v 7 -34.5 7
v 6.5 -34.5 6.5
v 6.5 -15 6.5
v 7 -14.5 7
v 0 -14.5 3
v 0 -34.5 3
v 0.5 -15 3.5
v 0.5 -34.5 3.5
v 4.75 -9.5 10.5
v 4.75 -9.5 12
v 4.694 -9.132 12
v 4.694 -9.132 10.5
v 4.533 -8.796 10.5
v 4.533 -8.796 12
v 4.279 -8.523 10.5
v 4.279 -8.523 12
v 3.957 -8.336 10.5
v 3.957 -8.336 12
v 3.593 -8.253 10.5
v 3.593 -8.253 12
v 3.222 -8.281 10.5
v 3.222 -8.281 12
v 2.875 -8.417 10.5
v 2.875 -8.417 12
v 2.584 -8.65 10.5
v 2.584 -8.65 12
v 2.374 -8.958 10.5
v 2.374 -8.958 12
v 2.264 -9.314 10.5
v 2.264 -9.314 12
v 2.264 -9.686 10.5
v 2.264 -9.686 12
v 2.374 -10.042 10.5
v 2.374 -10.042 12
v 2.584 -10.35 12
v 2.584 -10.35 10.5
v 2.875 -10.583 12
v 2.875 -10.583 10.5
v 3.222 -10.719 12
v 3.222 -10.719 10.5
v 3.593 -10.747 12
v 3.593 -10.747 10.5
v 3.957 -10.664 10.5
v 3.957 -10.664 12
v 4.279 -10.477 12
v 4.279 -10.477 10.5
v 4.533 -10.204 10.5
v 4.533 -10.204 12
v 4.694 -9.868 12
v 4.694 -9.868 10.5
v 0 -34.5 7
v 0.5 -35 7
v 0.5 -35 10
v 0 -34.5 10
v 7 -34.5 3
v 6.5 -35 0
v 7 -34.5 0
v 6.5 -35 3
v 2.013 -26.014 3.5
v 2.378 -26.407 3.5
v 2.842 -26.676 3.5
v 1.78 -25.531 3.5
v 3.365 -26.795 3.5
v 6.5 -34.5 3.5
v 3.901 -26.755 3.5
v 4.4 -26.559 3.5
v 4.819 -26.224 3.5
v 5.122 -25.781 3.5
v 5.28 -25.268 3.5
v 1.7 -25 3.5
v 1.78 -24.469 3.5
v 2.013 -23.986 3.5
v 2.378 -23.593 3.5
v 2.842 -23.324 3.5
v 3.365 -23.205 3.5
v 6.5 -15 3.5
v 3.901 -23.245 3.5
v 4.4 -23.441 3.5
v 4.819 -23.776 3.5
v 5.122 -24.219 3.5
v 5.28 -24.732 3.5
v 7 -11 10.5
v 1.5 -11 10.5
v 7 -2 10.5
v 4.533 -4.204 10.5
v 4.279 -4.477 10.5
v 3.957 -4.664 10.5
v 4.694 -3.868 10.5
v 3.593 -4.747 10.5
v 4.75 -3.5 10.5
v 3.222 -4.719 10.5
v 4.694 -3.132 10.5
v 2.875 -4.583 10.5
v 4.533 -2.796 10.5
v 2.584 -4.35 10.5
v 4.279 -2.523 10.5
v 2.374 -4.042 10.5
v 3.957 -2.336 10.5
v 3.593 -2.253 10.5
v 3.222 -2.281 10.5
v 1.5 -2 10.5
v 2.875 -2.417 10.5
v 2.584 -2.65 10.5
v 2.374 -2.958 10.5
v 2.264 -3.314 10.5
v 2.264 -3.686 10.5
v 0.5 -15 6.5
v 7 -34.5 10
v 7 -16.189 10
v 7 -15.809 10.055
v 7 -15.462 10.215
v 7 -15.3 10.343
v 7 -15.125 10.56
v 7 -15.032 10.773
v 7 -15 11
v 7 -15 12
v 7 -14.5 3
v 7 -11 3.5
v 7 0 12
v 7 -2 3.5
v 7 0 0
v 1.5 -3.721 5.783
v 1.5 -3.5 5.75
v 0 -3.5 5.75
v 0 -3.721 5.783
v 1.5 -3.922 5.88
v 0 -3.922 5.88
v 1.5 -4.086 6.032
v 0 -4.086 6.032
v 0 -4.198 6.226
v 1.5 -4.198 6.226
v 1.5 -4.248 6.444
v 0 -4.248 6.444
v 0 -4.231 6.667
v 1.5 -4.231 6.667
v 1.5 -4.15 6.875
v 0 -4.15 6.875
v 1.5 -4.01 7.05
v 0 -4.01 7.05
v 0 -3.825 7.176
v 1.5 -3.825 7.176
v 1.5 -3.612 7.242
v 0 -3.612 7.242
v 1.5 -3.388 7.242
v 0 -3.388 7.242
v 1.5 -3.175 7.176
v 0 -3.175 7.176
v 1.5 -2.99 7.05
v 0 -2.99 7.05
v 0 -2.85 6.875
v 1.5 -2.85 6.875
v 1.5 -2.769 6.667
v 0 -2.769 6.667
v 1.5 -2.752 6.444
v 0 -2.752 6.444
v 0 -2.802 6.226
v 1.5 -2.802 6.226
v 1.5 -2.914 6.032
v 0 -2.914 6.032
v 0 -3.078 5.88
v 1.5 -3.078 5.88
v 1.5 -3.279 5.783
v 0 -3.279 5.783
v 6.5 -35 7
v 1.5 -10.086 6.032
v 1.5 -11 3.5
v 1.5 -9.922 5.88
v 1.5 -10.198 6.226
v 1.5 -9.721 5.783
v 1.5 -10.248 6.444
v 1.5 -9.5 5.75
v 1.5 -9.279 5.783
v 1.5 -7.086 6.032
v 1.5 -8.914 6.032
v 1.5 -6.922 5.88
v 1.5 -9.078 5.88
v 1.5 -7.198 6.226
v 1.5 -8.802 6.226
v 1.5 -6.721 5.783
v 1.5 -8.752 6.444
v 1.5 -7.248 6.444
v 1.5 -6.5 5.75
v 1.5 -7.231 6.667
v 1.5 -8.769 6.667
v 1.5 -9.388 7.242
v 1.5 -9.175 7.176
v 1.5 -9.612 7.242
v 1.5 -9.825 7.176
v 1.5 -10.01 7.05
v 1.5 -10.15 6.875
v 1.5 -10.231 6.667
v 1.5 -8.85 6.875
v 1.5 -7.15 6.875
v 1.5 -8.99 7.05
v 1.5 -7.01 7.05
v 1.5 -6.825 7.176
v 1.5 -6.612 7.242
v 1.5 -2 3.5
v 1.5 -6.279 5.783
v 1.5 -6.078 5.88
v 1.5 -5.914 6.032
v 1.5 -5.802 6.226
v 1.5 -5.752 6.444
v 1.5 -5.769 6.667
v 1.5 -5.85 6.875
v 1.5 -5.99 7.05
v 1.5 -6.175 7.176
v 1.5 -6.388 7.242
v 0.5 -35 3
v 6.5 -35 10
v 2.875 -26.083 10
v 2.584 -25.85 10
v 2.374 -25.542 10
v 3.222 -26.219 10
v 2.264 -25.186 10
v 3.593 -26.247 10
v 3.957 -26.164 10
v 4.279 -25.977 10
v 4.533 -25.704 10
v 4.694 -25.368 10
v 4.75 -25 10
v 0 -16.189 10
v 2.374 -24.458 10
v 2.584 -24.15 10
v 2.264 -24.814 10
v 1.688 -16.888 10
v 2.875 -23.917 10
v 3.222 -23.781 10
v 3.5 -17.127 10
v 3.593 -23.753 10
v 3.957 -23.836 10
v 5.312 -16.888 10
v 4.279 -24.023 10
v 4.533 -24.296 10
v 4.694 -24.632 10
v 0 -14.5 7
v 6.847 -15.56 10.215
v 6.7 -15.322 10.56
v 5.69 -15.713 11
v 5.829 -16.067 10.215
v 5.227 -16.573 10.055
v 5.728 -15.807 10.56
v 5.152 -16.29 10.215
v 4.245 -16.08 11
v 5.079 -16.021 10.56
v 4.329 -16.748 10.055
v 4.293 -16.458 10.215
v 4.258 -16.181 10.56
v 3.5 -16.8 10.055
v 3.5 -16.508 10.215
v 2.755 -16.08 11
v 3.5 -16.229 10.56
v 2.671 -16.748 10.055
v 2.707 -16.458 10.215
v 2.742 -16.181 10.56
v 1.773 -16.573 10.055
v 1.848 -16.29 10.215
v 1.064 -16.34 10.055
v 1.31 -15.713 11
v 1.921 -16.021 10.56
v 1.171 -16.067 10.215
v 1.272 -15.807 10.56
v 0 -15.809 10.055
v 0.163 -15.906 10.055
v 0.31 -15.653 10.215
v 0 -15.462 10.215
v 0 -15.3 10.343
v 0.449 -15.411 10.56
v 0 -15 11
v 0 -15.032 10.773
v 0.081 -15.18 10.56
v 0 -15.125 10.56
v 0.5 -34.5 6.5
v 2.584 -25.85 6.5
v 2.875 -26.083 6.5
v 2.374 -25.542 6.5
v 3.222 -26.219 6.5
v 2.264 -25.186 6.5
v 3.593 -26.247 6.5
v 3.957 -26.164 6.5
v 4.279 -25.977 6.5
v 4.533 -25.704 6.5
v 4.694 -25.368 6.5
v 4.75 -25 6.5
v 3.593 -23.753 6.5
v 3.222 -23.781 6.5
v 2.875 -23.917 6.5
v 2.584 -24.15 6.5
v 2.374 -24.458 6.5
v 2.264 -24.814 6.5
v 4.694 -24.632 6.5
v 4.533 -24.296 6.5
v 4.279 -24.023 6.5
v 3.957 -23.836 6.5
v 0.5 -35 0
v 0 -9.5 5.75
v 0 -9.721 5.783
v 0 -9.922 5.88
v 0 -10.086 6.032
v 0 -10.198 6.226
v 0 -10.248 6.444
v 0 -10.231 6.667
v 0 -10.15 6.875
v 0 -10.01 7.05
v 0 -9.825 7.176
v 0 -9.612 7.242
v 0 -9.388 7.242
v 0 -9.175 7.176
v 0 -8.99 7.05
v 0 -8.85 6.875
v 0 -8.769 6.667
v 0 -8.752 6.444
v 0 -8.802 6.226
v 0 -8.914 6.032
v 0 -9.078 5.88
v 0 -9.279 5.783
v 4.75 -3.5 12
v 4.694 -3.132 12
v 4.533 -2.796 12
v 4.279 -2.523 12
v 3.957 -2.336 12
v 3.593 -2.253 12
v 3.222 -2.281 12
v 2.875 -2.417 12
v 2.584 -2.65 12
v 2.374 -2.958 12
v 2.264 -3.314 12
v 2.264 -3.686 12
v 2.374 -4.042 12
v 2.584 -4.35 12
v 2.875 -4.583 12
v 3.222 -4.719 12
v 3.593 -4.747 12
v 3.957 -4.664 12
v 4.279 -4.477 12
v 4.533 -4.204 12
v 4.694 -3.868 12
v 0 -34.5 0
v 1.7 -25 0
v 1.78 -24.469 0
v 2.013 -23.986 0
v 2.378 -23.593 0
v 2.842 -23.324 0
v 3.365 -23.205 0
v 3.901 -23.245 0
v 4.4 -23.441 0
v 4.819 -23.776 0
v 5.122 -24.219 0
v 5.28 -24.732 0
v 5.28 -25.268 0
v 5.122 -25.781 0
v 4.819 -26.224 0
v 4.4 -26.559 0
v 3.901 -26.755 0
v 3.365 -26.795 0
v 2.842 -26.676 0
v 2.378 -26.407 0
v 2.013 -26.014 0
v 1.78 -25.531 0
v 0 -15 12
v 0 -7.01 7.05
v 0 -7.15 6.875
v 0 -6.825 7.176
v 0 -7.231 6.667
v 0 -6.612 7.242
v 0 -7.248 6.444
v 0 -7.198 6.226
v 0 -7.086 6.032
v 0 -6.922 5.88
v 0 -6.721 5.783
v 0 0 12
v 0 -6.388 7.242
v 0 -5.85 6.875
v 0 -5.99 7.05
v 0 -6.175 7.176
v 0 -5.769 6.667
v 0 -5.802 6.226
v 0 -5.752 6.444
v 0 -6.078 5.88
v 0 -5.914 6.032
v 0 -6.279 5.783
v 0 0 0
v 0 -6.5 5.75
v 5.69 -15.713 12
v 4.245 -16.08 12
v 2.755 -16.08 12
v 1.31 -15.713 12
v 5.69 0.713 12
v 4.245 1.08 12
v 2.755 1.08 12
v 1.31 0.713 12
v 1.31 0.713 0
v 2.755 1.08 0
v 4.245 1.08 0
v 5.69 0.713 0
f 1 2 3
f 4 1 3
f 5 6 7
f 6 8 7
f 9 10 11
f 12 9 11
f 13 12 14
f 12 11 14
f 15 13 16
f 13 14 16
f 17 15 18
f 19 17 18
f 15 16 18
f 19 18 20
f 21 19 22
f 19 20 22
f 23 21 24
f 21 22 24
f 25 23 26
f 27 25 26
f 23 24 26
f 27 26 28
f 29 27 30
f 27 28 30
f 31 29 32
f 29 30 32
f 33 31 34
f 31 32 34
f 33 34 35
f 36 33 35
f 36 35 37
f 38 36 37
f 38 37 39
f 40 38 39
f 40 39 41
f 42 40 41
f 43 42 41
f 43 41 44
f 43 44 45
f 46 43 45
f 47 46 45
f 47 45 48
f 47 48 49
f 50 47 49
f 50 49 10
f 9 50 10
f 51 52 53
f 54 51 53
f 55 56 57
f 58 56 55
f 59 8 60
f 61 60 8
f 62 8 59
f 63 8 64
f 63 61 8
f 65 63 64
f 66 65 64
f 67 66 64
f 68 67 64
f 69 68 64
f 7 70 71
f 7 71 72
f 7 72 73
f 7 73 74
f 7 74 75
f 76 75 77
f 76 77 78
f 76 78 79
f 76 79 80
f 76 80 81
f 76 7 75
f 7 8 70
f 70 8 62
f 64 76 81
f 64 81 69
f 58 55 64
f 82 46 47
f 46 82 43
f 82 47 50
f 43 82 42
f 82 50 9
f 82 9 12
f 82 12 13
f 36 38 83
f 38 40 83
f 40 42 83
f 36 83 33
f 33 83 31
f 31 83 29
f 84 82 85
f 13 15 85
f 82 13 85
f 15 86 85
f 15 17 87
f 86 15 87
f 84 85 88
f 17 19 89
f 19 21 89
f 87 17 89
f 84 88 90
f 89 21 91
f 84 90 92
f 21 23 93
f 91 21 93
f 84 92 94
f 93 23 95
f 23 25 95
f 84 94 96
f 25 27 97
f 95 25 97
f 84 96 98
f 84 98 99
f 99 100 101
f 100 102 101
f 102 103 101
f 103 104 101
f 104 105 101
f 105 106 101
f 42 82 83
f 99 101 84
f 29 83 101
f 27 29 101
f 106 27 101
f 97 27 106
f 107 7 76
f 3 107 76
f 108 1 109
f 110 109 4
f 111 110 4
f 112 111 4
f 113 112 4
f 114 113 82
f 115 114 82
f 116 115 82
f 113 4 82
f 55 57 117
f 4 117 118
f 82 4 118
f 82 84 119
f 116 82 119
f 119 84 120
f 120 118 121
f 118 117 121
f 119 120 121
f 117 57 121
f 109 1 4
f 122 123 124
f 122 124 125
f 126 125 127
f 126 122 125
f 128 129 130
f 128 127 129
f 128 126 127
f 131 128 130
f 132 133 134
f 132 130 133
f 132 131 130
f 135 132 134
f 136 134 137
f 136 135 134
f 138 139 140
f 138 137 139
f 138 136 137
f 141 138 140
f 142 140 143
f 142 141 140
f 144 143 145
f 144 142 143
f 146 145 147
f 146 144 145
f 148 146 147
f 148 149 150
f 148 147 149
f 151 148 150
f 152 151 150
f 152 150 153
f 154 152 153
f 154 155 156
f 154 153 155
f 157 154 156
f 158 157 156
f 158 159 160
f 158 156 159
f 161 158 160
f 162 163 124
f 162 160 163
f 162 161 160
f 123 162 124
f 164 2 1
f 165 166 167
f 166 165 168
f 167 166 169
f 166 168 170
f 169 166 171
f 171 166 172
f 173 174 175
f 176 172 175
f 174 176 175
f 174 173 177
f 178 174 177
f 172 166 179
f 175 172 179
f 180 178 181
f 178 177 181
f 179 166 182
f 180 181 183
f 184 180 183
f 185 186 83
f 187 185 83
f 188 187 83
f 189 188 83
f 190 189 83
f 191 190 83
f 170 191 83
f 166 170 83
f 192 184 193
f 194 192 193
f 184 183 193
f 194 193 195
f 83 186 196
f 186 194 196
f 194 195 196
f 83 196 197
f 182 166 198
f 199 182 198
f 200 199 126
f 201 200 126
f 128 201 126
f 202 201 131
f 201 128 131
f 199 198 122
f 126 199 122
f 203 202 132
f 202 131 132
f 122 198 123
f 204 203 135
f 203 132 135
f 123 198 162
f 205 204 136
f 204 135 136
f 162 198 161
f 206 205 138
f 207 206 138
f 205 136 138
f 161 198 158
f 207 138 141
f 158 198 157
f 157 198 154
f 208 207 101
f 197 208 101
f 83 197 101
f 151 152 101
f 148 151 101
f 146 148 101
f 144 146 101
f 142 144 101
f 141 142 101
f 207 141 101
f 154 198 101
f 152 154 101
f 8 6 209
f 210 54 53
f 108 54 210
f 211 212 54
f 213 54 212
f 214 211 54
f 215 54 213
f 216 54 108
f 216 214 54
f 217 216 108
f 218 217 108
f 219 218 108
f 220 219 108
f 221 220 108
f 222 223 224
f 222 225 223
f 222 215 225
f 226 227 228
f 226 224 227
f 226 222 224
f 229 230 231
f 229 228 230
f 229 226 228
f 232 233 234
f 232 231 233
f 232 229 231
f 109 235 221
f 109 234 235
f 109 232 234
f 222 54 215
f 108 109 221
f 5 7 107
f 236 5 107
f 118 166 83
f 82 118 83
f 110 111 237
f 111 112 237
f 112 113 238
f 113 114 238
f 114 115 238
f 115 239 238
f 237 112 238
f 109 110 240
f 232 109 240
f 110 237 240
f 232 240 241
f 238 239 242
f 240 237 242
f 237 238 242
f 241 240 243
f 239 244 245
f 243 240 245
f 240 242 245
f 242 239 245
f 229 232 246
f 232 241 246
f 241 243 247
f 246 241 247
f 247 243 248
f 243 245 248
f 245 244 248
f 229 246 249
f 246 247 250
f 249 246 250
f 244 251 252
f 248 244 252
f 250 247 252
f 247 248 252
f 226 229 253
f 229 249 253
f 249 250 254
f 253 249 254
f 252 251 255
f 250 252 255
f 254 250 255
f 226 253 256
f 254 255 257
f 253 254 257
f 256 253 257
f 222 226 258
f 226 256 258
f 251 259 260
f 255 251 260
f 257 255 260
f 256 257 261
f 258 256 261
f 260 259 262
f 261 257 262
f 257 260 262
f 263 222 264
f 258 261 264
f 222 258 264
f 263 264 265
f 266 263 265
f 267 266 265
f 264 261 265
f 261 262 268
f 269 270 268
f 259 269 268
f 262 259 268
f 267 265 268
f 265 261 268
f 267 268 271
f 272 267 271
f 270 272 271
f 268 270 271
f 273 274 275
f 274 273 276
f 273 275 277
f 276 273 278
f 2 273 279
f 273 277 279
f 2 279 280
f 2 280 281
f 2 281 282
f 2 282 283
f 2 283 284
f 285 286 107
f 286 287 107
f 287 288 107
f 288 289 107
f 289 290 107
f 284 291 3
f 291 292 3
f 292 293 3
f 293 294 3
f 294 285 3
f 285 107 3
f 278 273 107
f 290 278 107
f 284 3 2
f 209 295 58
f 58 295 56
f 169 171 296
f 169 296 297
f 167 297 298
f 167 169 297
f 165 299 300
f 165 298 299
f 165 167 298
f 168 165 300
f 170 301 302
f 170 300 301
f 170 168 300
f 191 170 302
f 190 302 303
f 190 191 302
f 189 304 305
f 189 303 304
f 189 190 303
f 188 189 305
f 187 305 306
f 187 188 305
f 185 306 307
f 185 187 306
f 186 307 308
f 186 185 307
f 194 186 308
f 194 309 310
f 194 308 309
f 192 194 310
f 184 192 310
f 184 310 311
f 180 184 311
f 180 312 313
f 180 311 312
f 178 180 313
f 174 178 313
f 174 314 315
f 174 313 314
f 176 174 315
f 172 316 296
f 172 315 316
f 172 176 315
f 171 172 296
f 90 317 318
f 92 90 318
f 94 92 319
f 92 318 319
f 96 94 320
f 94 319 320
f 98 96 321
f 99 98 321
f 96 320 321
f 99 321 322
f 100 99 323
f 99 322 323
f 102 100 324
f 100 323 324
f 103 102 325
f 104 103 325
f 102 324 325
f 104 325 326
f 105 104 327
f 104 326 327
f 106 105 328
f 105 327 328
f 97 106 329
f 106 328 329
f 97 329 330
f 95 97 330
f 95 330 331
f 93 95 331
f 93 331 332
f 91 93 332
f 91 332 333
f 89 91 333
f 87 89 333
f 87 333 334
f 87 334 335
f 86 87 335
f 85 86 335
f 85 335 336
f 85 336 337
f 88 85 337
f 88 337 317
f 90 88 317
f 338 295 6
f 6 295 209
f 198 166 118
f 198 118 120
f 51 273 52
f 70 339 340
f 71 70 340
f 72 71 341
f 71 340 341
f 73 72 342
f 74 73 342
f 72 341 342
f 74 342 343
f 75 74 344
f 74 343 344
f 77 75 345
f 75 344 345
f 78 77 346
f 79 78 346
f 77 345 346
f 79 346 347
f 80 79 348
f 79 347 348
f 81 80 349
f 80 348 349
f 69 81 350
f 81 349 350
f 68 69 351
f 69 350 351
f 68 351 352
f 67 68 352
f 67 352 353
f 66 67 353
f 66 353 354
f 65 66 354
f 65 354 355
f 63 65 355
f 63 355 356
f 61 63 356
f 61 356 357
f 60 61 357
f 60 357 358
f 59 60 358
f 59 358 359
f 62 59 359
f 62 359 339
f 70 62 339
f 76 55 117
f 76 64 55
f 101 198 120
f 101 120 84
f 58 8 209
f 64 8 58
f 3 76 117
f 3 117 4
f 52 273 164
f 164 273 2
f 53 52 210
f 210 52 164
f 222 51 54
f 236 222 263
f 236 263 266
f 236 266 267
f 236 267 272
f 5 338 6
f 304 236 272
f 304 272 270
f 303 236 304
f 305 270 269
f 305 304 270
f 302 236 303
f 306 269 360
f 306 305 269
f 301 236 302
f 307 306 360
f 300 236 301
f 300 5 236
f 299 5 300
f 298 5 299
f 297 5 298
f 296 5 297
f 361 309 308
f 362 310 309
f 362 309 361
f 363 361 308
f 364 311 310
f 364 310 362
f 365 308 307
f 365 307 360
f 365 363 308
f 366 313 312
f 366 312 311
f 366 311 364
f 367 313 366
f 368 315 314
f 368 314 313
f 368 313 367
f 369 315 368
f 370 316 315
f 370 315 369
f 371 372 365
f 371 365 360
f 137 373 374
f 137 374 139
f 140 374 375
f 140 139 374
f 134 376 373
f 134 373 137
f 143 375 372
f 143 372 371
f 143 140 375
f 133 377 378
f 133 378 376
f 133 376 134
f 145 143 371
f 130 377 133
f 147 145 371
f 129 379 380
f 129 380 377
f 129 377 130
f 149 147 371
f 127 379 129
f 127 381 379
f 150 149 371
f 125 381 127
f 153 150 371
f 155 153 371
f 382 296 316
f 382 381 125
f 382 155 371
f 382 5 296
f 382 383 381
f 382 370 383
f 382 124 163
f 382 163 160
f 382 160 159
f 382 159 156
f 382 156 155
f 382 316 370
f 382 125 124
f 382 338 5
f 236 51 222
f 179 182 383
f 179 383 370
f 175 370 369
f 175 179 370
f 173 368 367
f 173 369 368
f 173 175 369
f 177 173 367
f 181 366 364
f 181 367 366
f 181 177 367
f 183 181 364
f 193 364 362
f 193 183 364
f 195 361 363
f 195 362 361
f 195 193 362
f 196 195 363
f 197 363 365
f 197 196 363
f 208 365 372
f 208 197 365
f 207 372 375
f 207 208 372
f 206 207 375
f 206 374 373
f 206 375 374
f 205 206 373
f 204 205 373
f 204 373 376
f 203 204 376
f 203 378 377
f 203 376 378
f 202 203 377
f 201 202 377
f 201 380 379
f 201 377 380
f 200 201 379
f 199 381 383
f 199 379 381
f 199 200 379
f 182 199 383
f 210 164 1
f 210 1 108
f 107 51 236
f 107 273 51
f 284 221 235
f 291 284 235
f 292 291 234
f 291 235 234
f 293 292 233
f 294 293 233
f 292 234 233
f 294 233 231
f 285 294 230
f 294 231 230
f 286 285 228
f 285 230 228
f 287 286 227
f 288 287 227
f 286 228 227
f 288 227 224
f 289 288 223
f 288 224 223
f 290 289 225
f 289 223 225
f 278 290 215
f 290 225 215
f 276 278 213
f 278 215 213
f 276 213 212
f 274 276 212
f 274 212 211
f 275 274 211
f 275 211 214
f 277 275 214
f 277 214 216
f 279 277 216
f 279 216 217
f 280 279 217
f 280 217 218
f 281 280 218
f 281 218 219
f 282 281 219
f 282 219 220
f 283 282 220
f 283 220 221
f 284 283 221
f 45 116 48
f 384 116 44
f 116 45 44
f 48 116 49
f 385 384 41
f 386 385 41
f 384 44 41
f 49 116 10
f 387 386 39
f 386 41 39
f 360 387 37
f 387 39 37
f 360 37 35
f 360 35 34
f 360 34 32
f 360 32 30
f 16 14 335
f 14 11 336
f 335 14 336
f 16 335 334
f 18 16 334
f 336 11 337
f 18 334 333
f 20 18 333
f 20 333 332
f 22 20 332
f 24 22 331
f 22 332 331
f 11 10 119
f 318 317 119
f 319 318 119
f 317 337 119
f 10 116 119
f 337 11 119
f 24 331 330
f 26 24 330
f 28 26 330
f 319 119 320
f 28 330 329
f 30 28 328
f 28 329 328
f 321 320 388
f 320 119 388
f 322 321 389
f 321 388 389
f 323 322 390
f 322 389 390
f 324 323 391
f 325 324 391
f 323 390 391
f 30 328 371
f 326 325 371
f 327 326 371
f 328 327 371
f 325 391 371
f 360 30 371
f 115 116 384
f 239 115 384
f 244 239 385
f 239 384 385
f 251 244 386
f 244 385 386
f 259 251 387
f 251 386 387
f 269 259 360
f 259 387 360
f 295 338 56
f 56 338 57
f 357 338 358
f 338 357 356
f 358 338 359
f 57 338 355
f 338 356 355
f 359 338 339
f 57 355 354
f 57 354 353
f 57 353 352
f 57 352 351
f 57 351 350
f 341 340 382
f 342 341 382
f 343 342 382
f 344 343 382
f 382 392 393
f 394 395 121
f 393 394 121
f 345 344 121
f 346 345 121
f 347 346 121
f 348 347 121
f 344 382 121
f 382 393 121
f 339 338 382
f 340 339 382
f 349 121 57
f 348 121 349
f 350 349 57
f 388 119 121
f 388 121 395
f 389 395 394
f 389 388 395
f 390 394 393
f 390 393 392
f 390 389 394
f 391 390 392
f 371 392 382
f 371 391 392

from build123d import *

# Parameters (mm, degrees)
SKETCH1_W           = 7
SKETCH1_H           = 35
BOSS_EXTRUDE1_DEPTH = 3.5
SKETCH2_W           = 7
SKETCH2_H           = 15
BOSS_EXTRUDE2_DEPTH = 3
SKETCH3_W           = 7
SKETCH3_H           = 35
BOSS_EXTRUDE3_DEPTH = 3.5
SKETCH4_W           = 7
SKETCH4_H           = 15
BOSS_EXTRUDE4_DEPTH = 2
CUT_EXTRUDE1_START  = -1.5
SKETCH5_W           = 7
SKETCH5_H           = 9
CUT_EXTRUDE1_DEPTH  = 5.5
CUT_EXTRUDE2_REACH  = 39.407
SKETCH6_R           = 0.75
CUT_EXTRUDE3_REACH  = 39.656
SKETCH7_R           = 1.25
BOSS_EXTRUDE5_DEPTH = 12
BOSS_EXTRUDE6_DEPTH = 2
CHAMFER1_SIZE       = 0.5
CUT_EXTRUDE4_REACH  = 39.068
SKETCH11_R          = 1.25
CUT_EXTRUDE5_REACH  = 39.656
SKETCH12_R          = 1.8
FILLET1_R           = 1


with BuildPart() as part:
    # Sketch1 → Boss-Extrude1 (new body)
    with BuildSketch(Plane.XY):
        with Locations((3.5, -17.5)):
            Rectangle(SKETCH1_W, SKETCH1_H)
    extrude(amount=BOSS_EXTRUDE1_DEPTH)

    # Sketch2 → Boss-Extrude2 (add)
    with BuildSketch(Plane.XY.offset(3.5)):
        with Locations((3.5, -7.5)):
            Rectangle(SKETCH2_W, SKETCH2_H)
    extrude(amount=BOSS_EXTRUDE2_DEPTH)

    # Sketch3 → Boss-Extrude3 (add)
    with BuildSketch(Plane.XY.offset(6.5)):
        with Locations((3.5, -17.5)):
            Rectangle(SKETCH3_W, SKETCH3_H)
    extrude(amount=BOSS_EXTRUDE3_DEPTH)

    # Sketch4 → Boss-Extrude4 (add)
    with BuildSketch(Plane.XY.offset(10)):
        with Locations((3.5, -7.5)):
            Rectangle(SKETCH4_W, SKETCH4_H)
    extrude(amount=BOSS_EXTRUDE4_DEPTH)

    # Sketch5 → Cut-Extrude1 (cut)
    with BuildSketch(Plane.ZY.offset(CUT_EXTRUDE1_START)):
        with Locations((7, -6.5)):
            Rectangle(SKETCH5_W, SKETCH5_H)
    extrude(amount=-CUT_EXTRUDE1_DEPTH, mode=Mode.SUBTRACT)

    # Sketch6 → Cut-Extrude2 (cut, up to next)
    with BuildSketch(Plane.ZY.offset(-5.5), mode=Mode.PRIVATE) as cut_extrude2_sk1:
        with Locations(Location((6.5, -3.5, 0), (0, 0, 180))):
            Circle(SKETCH6_R)
    cut_extrude2_tool1 = extrude(cut_extrude2_sk1.sketch, amount=CUT_EXTRUDE2_REACH, mode=Mode.PRIVATE) & part.part
    # Sketch6 → Cut-Extrude2 (cut, up to next)
    with BuildSketch(Plane.ZY.offset(-5.5), mode=Mode.PRIVATE) as cut_extrude2_sk2:
        with Locations(Location((6.5, -9.5, 0), (0, 0, 180))):
            Circle(SKETCH6_R)
    cut_extrude2_tool2 = extrude(cut_extrude2_sk2.sketch, amount=CUT_EXTRUDE2_REACH, mode=Mode.PRIVATE) & part.part
    # Sketch6 → Cut-Extrude2 (cut, up to next)
    with BuildSketch(Plane.ZY.offset(-5.5), mode=Mode.PRIVATE) as cut_extrude2_sk3:
        with Locations(Location((6.5, -6.5, 0), (0, 0, 180))):
            Circle(SKETCH6_R)
    cut_extrude2_tool3 = extrude(cut_extrude2_sk3.sketch, amount=CUT_EXTRUDE2_REACH, mode=Mode.PRIVATE) & part.part
    add(cut_extrude2_tool1.solids().sort_by_distance((5.5, -3.5, 6.5))[0], mode=Mode.SUBTRACT)
    add(cut_extrude2_tool2.solids().sort_by_distance((5.5, -9.5, 6.5))[0], mode=Mode.SUBTRACT)
    add(cut_extrude2_tool3.solids().sort_by_distance((5.5, -6.5, 6.5))[0], mode=Mode.SUBTRACT)

    # Sketch7 → Cut-Extrude3 (cut, up to next)
    with BuildSketch(Plane.XY.offset(12), mode=Mode.PRIVATE) as cut_extrude3_sk1:
        with Locations((3.5, -3.5)):
            Circle(SKETCH7_R)
    cut_extrude3_tool1 = extrude(cut_extrude3_sk1.sketch, amount=-CUT_EXTRUDE3_REACH, mode=Mode.PRIVATE) & part.part
    # Sketch7 → Cut-Extrude3 (cut, up to next)
    with BuildSketch(Plane.XY.offset(12), mode=Mode.PRIVATE) as cut_extrude3_sk2:
        with Locations((3.5, -9.5)):
            Circle(SKETCH7_R)
    cut_extrude3_tool2 = extrude(cut_extrude3_sk2.sketch, amount=-CUT_EXTRUDE3_REACH, mode=Mode.PRIVATE) & part.part
    add(cut_extrude3_tool1.solids().sort_by_distance((3.5, -3.5, 12))[0], mode=Mode.SUBTRACT)
    add(cut_extrude3_tool2.solids().sort_by_distance((3.5, -9.5, 12))[0], mode=Mode.SUBTRACT)

    # Sketch9 → Boss-Extrude5 (add)
    with BuildSketch(Plane.XY.offset(12)):
        with BuildLine():
            Line((0, 0), (7, 0))
            ThreePointArc((7, 0), (3.5, 1.126602828), (0, 0))
        make_face()
    extrude(amount=-BOSS_EXTRUDE5_DEPTH)

    # Sketch10 → Boss-Extrude6 (add)
    with BuildSketch(Plane.XY.offset(12)):
        with BuildLine():
            Line((0, -15), (7, -15))
            ThreePointArc((7, -15), (3.5, -16.126602828), (0, -15))
        make_face()
    extrude(amount=-BOSS_EXTRUDE6_DEPTH)

    # Chamfer1
    chamfer1_edges = [part.edges().sort_by_distance(p)[0] for p in [
        (7, -25, 3.5),
        (0, -25, 3.5),
        (0, -15, 5),
        (7, -15, 5),
        (0, -25, 6.5),
        (3.5, -35, 6.5),
        (0, -35, 8.25),
        (7, -25, 6.5),
        (7, -35, 8.25),
        (7, -35, 1.75),
        (0, -35, 1.75),
        (3.5, -35, 3.5),
    ]]
    chamfer(chamfer1_edges, length=CHAMFER1_SIZE)

    # Sketch11 → Cut-Extrude4 (cut, up to next)
    with BuildSketch(Plane.XY.offset(10), mode=Mode.PRIVATE) as cut_extrude4_sk1:
        with Locations((3.5, -25)):
            Circle(SKETCH11_R)
    cut_extrude4_tool1 = extrude(cut_extrude4_sk1.sketch, amount=-CUT_EXTRUDE4_REACH, mode=Mode.PRIVATE) & part.part
    add(cut_extrude4_tool1.solids().sort_by_distance((3.5, -25, 10))[0], mode=Mode.SUBTRACT)

    # Sketch12 → Cut-Extrude5 (cut, up to next)
    with BuildSketch(Plane(origin=(0, 0, 0), x_dir=(-1, 0, 0), z_dir=(0, 0, -1)), mode=Mode.PRIVATE) as cut_extrude5_sk1:
        with Locations((-3.5, -25)):
            Circle(SKETCH12_R)
    cut_extrude5_tool1 = extrude(cut_extrude5_sk1.sketch, amount=-CUT_EXTRUDE5_REACH, mode=Mode.PRIVATE) & part.part
    add(cut_extrude5_tool1.solids().sort_by_distance((3.5, -25, 0))[0], mode=Mode.SUBTRACT)

    # Fillet1
    fillet1_edges = [part.edges().sort_by_distance(p)[0] for p in [
        (3.5, -16.126602828, 10),
    ]]
    fillet(fillet1_edges, radius=FILLET1_R)


solid = part.part
